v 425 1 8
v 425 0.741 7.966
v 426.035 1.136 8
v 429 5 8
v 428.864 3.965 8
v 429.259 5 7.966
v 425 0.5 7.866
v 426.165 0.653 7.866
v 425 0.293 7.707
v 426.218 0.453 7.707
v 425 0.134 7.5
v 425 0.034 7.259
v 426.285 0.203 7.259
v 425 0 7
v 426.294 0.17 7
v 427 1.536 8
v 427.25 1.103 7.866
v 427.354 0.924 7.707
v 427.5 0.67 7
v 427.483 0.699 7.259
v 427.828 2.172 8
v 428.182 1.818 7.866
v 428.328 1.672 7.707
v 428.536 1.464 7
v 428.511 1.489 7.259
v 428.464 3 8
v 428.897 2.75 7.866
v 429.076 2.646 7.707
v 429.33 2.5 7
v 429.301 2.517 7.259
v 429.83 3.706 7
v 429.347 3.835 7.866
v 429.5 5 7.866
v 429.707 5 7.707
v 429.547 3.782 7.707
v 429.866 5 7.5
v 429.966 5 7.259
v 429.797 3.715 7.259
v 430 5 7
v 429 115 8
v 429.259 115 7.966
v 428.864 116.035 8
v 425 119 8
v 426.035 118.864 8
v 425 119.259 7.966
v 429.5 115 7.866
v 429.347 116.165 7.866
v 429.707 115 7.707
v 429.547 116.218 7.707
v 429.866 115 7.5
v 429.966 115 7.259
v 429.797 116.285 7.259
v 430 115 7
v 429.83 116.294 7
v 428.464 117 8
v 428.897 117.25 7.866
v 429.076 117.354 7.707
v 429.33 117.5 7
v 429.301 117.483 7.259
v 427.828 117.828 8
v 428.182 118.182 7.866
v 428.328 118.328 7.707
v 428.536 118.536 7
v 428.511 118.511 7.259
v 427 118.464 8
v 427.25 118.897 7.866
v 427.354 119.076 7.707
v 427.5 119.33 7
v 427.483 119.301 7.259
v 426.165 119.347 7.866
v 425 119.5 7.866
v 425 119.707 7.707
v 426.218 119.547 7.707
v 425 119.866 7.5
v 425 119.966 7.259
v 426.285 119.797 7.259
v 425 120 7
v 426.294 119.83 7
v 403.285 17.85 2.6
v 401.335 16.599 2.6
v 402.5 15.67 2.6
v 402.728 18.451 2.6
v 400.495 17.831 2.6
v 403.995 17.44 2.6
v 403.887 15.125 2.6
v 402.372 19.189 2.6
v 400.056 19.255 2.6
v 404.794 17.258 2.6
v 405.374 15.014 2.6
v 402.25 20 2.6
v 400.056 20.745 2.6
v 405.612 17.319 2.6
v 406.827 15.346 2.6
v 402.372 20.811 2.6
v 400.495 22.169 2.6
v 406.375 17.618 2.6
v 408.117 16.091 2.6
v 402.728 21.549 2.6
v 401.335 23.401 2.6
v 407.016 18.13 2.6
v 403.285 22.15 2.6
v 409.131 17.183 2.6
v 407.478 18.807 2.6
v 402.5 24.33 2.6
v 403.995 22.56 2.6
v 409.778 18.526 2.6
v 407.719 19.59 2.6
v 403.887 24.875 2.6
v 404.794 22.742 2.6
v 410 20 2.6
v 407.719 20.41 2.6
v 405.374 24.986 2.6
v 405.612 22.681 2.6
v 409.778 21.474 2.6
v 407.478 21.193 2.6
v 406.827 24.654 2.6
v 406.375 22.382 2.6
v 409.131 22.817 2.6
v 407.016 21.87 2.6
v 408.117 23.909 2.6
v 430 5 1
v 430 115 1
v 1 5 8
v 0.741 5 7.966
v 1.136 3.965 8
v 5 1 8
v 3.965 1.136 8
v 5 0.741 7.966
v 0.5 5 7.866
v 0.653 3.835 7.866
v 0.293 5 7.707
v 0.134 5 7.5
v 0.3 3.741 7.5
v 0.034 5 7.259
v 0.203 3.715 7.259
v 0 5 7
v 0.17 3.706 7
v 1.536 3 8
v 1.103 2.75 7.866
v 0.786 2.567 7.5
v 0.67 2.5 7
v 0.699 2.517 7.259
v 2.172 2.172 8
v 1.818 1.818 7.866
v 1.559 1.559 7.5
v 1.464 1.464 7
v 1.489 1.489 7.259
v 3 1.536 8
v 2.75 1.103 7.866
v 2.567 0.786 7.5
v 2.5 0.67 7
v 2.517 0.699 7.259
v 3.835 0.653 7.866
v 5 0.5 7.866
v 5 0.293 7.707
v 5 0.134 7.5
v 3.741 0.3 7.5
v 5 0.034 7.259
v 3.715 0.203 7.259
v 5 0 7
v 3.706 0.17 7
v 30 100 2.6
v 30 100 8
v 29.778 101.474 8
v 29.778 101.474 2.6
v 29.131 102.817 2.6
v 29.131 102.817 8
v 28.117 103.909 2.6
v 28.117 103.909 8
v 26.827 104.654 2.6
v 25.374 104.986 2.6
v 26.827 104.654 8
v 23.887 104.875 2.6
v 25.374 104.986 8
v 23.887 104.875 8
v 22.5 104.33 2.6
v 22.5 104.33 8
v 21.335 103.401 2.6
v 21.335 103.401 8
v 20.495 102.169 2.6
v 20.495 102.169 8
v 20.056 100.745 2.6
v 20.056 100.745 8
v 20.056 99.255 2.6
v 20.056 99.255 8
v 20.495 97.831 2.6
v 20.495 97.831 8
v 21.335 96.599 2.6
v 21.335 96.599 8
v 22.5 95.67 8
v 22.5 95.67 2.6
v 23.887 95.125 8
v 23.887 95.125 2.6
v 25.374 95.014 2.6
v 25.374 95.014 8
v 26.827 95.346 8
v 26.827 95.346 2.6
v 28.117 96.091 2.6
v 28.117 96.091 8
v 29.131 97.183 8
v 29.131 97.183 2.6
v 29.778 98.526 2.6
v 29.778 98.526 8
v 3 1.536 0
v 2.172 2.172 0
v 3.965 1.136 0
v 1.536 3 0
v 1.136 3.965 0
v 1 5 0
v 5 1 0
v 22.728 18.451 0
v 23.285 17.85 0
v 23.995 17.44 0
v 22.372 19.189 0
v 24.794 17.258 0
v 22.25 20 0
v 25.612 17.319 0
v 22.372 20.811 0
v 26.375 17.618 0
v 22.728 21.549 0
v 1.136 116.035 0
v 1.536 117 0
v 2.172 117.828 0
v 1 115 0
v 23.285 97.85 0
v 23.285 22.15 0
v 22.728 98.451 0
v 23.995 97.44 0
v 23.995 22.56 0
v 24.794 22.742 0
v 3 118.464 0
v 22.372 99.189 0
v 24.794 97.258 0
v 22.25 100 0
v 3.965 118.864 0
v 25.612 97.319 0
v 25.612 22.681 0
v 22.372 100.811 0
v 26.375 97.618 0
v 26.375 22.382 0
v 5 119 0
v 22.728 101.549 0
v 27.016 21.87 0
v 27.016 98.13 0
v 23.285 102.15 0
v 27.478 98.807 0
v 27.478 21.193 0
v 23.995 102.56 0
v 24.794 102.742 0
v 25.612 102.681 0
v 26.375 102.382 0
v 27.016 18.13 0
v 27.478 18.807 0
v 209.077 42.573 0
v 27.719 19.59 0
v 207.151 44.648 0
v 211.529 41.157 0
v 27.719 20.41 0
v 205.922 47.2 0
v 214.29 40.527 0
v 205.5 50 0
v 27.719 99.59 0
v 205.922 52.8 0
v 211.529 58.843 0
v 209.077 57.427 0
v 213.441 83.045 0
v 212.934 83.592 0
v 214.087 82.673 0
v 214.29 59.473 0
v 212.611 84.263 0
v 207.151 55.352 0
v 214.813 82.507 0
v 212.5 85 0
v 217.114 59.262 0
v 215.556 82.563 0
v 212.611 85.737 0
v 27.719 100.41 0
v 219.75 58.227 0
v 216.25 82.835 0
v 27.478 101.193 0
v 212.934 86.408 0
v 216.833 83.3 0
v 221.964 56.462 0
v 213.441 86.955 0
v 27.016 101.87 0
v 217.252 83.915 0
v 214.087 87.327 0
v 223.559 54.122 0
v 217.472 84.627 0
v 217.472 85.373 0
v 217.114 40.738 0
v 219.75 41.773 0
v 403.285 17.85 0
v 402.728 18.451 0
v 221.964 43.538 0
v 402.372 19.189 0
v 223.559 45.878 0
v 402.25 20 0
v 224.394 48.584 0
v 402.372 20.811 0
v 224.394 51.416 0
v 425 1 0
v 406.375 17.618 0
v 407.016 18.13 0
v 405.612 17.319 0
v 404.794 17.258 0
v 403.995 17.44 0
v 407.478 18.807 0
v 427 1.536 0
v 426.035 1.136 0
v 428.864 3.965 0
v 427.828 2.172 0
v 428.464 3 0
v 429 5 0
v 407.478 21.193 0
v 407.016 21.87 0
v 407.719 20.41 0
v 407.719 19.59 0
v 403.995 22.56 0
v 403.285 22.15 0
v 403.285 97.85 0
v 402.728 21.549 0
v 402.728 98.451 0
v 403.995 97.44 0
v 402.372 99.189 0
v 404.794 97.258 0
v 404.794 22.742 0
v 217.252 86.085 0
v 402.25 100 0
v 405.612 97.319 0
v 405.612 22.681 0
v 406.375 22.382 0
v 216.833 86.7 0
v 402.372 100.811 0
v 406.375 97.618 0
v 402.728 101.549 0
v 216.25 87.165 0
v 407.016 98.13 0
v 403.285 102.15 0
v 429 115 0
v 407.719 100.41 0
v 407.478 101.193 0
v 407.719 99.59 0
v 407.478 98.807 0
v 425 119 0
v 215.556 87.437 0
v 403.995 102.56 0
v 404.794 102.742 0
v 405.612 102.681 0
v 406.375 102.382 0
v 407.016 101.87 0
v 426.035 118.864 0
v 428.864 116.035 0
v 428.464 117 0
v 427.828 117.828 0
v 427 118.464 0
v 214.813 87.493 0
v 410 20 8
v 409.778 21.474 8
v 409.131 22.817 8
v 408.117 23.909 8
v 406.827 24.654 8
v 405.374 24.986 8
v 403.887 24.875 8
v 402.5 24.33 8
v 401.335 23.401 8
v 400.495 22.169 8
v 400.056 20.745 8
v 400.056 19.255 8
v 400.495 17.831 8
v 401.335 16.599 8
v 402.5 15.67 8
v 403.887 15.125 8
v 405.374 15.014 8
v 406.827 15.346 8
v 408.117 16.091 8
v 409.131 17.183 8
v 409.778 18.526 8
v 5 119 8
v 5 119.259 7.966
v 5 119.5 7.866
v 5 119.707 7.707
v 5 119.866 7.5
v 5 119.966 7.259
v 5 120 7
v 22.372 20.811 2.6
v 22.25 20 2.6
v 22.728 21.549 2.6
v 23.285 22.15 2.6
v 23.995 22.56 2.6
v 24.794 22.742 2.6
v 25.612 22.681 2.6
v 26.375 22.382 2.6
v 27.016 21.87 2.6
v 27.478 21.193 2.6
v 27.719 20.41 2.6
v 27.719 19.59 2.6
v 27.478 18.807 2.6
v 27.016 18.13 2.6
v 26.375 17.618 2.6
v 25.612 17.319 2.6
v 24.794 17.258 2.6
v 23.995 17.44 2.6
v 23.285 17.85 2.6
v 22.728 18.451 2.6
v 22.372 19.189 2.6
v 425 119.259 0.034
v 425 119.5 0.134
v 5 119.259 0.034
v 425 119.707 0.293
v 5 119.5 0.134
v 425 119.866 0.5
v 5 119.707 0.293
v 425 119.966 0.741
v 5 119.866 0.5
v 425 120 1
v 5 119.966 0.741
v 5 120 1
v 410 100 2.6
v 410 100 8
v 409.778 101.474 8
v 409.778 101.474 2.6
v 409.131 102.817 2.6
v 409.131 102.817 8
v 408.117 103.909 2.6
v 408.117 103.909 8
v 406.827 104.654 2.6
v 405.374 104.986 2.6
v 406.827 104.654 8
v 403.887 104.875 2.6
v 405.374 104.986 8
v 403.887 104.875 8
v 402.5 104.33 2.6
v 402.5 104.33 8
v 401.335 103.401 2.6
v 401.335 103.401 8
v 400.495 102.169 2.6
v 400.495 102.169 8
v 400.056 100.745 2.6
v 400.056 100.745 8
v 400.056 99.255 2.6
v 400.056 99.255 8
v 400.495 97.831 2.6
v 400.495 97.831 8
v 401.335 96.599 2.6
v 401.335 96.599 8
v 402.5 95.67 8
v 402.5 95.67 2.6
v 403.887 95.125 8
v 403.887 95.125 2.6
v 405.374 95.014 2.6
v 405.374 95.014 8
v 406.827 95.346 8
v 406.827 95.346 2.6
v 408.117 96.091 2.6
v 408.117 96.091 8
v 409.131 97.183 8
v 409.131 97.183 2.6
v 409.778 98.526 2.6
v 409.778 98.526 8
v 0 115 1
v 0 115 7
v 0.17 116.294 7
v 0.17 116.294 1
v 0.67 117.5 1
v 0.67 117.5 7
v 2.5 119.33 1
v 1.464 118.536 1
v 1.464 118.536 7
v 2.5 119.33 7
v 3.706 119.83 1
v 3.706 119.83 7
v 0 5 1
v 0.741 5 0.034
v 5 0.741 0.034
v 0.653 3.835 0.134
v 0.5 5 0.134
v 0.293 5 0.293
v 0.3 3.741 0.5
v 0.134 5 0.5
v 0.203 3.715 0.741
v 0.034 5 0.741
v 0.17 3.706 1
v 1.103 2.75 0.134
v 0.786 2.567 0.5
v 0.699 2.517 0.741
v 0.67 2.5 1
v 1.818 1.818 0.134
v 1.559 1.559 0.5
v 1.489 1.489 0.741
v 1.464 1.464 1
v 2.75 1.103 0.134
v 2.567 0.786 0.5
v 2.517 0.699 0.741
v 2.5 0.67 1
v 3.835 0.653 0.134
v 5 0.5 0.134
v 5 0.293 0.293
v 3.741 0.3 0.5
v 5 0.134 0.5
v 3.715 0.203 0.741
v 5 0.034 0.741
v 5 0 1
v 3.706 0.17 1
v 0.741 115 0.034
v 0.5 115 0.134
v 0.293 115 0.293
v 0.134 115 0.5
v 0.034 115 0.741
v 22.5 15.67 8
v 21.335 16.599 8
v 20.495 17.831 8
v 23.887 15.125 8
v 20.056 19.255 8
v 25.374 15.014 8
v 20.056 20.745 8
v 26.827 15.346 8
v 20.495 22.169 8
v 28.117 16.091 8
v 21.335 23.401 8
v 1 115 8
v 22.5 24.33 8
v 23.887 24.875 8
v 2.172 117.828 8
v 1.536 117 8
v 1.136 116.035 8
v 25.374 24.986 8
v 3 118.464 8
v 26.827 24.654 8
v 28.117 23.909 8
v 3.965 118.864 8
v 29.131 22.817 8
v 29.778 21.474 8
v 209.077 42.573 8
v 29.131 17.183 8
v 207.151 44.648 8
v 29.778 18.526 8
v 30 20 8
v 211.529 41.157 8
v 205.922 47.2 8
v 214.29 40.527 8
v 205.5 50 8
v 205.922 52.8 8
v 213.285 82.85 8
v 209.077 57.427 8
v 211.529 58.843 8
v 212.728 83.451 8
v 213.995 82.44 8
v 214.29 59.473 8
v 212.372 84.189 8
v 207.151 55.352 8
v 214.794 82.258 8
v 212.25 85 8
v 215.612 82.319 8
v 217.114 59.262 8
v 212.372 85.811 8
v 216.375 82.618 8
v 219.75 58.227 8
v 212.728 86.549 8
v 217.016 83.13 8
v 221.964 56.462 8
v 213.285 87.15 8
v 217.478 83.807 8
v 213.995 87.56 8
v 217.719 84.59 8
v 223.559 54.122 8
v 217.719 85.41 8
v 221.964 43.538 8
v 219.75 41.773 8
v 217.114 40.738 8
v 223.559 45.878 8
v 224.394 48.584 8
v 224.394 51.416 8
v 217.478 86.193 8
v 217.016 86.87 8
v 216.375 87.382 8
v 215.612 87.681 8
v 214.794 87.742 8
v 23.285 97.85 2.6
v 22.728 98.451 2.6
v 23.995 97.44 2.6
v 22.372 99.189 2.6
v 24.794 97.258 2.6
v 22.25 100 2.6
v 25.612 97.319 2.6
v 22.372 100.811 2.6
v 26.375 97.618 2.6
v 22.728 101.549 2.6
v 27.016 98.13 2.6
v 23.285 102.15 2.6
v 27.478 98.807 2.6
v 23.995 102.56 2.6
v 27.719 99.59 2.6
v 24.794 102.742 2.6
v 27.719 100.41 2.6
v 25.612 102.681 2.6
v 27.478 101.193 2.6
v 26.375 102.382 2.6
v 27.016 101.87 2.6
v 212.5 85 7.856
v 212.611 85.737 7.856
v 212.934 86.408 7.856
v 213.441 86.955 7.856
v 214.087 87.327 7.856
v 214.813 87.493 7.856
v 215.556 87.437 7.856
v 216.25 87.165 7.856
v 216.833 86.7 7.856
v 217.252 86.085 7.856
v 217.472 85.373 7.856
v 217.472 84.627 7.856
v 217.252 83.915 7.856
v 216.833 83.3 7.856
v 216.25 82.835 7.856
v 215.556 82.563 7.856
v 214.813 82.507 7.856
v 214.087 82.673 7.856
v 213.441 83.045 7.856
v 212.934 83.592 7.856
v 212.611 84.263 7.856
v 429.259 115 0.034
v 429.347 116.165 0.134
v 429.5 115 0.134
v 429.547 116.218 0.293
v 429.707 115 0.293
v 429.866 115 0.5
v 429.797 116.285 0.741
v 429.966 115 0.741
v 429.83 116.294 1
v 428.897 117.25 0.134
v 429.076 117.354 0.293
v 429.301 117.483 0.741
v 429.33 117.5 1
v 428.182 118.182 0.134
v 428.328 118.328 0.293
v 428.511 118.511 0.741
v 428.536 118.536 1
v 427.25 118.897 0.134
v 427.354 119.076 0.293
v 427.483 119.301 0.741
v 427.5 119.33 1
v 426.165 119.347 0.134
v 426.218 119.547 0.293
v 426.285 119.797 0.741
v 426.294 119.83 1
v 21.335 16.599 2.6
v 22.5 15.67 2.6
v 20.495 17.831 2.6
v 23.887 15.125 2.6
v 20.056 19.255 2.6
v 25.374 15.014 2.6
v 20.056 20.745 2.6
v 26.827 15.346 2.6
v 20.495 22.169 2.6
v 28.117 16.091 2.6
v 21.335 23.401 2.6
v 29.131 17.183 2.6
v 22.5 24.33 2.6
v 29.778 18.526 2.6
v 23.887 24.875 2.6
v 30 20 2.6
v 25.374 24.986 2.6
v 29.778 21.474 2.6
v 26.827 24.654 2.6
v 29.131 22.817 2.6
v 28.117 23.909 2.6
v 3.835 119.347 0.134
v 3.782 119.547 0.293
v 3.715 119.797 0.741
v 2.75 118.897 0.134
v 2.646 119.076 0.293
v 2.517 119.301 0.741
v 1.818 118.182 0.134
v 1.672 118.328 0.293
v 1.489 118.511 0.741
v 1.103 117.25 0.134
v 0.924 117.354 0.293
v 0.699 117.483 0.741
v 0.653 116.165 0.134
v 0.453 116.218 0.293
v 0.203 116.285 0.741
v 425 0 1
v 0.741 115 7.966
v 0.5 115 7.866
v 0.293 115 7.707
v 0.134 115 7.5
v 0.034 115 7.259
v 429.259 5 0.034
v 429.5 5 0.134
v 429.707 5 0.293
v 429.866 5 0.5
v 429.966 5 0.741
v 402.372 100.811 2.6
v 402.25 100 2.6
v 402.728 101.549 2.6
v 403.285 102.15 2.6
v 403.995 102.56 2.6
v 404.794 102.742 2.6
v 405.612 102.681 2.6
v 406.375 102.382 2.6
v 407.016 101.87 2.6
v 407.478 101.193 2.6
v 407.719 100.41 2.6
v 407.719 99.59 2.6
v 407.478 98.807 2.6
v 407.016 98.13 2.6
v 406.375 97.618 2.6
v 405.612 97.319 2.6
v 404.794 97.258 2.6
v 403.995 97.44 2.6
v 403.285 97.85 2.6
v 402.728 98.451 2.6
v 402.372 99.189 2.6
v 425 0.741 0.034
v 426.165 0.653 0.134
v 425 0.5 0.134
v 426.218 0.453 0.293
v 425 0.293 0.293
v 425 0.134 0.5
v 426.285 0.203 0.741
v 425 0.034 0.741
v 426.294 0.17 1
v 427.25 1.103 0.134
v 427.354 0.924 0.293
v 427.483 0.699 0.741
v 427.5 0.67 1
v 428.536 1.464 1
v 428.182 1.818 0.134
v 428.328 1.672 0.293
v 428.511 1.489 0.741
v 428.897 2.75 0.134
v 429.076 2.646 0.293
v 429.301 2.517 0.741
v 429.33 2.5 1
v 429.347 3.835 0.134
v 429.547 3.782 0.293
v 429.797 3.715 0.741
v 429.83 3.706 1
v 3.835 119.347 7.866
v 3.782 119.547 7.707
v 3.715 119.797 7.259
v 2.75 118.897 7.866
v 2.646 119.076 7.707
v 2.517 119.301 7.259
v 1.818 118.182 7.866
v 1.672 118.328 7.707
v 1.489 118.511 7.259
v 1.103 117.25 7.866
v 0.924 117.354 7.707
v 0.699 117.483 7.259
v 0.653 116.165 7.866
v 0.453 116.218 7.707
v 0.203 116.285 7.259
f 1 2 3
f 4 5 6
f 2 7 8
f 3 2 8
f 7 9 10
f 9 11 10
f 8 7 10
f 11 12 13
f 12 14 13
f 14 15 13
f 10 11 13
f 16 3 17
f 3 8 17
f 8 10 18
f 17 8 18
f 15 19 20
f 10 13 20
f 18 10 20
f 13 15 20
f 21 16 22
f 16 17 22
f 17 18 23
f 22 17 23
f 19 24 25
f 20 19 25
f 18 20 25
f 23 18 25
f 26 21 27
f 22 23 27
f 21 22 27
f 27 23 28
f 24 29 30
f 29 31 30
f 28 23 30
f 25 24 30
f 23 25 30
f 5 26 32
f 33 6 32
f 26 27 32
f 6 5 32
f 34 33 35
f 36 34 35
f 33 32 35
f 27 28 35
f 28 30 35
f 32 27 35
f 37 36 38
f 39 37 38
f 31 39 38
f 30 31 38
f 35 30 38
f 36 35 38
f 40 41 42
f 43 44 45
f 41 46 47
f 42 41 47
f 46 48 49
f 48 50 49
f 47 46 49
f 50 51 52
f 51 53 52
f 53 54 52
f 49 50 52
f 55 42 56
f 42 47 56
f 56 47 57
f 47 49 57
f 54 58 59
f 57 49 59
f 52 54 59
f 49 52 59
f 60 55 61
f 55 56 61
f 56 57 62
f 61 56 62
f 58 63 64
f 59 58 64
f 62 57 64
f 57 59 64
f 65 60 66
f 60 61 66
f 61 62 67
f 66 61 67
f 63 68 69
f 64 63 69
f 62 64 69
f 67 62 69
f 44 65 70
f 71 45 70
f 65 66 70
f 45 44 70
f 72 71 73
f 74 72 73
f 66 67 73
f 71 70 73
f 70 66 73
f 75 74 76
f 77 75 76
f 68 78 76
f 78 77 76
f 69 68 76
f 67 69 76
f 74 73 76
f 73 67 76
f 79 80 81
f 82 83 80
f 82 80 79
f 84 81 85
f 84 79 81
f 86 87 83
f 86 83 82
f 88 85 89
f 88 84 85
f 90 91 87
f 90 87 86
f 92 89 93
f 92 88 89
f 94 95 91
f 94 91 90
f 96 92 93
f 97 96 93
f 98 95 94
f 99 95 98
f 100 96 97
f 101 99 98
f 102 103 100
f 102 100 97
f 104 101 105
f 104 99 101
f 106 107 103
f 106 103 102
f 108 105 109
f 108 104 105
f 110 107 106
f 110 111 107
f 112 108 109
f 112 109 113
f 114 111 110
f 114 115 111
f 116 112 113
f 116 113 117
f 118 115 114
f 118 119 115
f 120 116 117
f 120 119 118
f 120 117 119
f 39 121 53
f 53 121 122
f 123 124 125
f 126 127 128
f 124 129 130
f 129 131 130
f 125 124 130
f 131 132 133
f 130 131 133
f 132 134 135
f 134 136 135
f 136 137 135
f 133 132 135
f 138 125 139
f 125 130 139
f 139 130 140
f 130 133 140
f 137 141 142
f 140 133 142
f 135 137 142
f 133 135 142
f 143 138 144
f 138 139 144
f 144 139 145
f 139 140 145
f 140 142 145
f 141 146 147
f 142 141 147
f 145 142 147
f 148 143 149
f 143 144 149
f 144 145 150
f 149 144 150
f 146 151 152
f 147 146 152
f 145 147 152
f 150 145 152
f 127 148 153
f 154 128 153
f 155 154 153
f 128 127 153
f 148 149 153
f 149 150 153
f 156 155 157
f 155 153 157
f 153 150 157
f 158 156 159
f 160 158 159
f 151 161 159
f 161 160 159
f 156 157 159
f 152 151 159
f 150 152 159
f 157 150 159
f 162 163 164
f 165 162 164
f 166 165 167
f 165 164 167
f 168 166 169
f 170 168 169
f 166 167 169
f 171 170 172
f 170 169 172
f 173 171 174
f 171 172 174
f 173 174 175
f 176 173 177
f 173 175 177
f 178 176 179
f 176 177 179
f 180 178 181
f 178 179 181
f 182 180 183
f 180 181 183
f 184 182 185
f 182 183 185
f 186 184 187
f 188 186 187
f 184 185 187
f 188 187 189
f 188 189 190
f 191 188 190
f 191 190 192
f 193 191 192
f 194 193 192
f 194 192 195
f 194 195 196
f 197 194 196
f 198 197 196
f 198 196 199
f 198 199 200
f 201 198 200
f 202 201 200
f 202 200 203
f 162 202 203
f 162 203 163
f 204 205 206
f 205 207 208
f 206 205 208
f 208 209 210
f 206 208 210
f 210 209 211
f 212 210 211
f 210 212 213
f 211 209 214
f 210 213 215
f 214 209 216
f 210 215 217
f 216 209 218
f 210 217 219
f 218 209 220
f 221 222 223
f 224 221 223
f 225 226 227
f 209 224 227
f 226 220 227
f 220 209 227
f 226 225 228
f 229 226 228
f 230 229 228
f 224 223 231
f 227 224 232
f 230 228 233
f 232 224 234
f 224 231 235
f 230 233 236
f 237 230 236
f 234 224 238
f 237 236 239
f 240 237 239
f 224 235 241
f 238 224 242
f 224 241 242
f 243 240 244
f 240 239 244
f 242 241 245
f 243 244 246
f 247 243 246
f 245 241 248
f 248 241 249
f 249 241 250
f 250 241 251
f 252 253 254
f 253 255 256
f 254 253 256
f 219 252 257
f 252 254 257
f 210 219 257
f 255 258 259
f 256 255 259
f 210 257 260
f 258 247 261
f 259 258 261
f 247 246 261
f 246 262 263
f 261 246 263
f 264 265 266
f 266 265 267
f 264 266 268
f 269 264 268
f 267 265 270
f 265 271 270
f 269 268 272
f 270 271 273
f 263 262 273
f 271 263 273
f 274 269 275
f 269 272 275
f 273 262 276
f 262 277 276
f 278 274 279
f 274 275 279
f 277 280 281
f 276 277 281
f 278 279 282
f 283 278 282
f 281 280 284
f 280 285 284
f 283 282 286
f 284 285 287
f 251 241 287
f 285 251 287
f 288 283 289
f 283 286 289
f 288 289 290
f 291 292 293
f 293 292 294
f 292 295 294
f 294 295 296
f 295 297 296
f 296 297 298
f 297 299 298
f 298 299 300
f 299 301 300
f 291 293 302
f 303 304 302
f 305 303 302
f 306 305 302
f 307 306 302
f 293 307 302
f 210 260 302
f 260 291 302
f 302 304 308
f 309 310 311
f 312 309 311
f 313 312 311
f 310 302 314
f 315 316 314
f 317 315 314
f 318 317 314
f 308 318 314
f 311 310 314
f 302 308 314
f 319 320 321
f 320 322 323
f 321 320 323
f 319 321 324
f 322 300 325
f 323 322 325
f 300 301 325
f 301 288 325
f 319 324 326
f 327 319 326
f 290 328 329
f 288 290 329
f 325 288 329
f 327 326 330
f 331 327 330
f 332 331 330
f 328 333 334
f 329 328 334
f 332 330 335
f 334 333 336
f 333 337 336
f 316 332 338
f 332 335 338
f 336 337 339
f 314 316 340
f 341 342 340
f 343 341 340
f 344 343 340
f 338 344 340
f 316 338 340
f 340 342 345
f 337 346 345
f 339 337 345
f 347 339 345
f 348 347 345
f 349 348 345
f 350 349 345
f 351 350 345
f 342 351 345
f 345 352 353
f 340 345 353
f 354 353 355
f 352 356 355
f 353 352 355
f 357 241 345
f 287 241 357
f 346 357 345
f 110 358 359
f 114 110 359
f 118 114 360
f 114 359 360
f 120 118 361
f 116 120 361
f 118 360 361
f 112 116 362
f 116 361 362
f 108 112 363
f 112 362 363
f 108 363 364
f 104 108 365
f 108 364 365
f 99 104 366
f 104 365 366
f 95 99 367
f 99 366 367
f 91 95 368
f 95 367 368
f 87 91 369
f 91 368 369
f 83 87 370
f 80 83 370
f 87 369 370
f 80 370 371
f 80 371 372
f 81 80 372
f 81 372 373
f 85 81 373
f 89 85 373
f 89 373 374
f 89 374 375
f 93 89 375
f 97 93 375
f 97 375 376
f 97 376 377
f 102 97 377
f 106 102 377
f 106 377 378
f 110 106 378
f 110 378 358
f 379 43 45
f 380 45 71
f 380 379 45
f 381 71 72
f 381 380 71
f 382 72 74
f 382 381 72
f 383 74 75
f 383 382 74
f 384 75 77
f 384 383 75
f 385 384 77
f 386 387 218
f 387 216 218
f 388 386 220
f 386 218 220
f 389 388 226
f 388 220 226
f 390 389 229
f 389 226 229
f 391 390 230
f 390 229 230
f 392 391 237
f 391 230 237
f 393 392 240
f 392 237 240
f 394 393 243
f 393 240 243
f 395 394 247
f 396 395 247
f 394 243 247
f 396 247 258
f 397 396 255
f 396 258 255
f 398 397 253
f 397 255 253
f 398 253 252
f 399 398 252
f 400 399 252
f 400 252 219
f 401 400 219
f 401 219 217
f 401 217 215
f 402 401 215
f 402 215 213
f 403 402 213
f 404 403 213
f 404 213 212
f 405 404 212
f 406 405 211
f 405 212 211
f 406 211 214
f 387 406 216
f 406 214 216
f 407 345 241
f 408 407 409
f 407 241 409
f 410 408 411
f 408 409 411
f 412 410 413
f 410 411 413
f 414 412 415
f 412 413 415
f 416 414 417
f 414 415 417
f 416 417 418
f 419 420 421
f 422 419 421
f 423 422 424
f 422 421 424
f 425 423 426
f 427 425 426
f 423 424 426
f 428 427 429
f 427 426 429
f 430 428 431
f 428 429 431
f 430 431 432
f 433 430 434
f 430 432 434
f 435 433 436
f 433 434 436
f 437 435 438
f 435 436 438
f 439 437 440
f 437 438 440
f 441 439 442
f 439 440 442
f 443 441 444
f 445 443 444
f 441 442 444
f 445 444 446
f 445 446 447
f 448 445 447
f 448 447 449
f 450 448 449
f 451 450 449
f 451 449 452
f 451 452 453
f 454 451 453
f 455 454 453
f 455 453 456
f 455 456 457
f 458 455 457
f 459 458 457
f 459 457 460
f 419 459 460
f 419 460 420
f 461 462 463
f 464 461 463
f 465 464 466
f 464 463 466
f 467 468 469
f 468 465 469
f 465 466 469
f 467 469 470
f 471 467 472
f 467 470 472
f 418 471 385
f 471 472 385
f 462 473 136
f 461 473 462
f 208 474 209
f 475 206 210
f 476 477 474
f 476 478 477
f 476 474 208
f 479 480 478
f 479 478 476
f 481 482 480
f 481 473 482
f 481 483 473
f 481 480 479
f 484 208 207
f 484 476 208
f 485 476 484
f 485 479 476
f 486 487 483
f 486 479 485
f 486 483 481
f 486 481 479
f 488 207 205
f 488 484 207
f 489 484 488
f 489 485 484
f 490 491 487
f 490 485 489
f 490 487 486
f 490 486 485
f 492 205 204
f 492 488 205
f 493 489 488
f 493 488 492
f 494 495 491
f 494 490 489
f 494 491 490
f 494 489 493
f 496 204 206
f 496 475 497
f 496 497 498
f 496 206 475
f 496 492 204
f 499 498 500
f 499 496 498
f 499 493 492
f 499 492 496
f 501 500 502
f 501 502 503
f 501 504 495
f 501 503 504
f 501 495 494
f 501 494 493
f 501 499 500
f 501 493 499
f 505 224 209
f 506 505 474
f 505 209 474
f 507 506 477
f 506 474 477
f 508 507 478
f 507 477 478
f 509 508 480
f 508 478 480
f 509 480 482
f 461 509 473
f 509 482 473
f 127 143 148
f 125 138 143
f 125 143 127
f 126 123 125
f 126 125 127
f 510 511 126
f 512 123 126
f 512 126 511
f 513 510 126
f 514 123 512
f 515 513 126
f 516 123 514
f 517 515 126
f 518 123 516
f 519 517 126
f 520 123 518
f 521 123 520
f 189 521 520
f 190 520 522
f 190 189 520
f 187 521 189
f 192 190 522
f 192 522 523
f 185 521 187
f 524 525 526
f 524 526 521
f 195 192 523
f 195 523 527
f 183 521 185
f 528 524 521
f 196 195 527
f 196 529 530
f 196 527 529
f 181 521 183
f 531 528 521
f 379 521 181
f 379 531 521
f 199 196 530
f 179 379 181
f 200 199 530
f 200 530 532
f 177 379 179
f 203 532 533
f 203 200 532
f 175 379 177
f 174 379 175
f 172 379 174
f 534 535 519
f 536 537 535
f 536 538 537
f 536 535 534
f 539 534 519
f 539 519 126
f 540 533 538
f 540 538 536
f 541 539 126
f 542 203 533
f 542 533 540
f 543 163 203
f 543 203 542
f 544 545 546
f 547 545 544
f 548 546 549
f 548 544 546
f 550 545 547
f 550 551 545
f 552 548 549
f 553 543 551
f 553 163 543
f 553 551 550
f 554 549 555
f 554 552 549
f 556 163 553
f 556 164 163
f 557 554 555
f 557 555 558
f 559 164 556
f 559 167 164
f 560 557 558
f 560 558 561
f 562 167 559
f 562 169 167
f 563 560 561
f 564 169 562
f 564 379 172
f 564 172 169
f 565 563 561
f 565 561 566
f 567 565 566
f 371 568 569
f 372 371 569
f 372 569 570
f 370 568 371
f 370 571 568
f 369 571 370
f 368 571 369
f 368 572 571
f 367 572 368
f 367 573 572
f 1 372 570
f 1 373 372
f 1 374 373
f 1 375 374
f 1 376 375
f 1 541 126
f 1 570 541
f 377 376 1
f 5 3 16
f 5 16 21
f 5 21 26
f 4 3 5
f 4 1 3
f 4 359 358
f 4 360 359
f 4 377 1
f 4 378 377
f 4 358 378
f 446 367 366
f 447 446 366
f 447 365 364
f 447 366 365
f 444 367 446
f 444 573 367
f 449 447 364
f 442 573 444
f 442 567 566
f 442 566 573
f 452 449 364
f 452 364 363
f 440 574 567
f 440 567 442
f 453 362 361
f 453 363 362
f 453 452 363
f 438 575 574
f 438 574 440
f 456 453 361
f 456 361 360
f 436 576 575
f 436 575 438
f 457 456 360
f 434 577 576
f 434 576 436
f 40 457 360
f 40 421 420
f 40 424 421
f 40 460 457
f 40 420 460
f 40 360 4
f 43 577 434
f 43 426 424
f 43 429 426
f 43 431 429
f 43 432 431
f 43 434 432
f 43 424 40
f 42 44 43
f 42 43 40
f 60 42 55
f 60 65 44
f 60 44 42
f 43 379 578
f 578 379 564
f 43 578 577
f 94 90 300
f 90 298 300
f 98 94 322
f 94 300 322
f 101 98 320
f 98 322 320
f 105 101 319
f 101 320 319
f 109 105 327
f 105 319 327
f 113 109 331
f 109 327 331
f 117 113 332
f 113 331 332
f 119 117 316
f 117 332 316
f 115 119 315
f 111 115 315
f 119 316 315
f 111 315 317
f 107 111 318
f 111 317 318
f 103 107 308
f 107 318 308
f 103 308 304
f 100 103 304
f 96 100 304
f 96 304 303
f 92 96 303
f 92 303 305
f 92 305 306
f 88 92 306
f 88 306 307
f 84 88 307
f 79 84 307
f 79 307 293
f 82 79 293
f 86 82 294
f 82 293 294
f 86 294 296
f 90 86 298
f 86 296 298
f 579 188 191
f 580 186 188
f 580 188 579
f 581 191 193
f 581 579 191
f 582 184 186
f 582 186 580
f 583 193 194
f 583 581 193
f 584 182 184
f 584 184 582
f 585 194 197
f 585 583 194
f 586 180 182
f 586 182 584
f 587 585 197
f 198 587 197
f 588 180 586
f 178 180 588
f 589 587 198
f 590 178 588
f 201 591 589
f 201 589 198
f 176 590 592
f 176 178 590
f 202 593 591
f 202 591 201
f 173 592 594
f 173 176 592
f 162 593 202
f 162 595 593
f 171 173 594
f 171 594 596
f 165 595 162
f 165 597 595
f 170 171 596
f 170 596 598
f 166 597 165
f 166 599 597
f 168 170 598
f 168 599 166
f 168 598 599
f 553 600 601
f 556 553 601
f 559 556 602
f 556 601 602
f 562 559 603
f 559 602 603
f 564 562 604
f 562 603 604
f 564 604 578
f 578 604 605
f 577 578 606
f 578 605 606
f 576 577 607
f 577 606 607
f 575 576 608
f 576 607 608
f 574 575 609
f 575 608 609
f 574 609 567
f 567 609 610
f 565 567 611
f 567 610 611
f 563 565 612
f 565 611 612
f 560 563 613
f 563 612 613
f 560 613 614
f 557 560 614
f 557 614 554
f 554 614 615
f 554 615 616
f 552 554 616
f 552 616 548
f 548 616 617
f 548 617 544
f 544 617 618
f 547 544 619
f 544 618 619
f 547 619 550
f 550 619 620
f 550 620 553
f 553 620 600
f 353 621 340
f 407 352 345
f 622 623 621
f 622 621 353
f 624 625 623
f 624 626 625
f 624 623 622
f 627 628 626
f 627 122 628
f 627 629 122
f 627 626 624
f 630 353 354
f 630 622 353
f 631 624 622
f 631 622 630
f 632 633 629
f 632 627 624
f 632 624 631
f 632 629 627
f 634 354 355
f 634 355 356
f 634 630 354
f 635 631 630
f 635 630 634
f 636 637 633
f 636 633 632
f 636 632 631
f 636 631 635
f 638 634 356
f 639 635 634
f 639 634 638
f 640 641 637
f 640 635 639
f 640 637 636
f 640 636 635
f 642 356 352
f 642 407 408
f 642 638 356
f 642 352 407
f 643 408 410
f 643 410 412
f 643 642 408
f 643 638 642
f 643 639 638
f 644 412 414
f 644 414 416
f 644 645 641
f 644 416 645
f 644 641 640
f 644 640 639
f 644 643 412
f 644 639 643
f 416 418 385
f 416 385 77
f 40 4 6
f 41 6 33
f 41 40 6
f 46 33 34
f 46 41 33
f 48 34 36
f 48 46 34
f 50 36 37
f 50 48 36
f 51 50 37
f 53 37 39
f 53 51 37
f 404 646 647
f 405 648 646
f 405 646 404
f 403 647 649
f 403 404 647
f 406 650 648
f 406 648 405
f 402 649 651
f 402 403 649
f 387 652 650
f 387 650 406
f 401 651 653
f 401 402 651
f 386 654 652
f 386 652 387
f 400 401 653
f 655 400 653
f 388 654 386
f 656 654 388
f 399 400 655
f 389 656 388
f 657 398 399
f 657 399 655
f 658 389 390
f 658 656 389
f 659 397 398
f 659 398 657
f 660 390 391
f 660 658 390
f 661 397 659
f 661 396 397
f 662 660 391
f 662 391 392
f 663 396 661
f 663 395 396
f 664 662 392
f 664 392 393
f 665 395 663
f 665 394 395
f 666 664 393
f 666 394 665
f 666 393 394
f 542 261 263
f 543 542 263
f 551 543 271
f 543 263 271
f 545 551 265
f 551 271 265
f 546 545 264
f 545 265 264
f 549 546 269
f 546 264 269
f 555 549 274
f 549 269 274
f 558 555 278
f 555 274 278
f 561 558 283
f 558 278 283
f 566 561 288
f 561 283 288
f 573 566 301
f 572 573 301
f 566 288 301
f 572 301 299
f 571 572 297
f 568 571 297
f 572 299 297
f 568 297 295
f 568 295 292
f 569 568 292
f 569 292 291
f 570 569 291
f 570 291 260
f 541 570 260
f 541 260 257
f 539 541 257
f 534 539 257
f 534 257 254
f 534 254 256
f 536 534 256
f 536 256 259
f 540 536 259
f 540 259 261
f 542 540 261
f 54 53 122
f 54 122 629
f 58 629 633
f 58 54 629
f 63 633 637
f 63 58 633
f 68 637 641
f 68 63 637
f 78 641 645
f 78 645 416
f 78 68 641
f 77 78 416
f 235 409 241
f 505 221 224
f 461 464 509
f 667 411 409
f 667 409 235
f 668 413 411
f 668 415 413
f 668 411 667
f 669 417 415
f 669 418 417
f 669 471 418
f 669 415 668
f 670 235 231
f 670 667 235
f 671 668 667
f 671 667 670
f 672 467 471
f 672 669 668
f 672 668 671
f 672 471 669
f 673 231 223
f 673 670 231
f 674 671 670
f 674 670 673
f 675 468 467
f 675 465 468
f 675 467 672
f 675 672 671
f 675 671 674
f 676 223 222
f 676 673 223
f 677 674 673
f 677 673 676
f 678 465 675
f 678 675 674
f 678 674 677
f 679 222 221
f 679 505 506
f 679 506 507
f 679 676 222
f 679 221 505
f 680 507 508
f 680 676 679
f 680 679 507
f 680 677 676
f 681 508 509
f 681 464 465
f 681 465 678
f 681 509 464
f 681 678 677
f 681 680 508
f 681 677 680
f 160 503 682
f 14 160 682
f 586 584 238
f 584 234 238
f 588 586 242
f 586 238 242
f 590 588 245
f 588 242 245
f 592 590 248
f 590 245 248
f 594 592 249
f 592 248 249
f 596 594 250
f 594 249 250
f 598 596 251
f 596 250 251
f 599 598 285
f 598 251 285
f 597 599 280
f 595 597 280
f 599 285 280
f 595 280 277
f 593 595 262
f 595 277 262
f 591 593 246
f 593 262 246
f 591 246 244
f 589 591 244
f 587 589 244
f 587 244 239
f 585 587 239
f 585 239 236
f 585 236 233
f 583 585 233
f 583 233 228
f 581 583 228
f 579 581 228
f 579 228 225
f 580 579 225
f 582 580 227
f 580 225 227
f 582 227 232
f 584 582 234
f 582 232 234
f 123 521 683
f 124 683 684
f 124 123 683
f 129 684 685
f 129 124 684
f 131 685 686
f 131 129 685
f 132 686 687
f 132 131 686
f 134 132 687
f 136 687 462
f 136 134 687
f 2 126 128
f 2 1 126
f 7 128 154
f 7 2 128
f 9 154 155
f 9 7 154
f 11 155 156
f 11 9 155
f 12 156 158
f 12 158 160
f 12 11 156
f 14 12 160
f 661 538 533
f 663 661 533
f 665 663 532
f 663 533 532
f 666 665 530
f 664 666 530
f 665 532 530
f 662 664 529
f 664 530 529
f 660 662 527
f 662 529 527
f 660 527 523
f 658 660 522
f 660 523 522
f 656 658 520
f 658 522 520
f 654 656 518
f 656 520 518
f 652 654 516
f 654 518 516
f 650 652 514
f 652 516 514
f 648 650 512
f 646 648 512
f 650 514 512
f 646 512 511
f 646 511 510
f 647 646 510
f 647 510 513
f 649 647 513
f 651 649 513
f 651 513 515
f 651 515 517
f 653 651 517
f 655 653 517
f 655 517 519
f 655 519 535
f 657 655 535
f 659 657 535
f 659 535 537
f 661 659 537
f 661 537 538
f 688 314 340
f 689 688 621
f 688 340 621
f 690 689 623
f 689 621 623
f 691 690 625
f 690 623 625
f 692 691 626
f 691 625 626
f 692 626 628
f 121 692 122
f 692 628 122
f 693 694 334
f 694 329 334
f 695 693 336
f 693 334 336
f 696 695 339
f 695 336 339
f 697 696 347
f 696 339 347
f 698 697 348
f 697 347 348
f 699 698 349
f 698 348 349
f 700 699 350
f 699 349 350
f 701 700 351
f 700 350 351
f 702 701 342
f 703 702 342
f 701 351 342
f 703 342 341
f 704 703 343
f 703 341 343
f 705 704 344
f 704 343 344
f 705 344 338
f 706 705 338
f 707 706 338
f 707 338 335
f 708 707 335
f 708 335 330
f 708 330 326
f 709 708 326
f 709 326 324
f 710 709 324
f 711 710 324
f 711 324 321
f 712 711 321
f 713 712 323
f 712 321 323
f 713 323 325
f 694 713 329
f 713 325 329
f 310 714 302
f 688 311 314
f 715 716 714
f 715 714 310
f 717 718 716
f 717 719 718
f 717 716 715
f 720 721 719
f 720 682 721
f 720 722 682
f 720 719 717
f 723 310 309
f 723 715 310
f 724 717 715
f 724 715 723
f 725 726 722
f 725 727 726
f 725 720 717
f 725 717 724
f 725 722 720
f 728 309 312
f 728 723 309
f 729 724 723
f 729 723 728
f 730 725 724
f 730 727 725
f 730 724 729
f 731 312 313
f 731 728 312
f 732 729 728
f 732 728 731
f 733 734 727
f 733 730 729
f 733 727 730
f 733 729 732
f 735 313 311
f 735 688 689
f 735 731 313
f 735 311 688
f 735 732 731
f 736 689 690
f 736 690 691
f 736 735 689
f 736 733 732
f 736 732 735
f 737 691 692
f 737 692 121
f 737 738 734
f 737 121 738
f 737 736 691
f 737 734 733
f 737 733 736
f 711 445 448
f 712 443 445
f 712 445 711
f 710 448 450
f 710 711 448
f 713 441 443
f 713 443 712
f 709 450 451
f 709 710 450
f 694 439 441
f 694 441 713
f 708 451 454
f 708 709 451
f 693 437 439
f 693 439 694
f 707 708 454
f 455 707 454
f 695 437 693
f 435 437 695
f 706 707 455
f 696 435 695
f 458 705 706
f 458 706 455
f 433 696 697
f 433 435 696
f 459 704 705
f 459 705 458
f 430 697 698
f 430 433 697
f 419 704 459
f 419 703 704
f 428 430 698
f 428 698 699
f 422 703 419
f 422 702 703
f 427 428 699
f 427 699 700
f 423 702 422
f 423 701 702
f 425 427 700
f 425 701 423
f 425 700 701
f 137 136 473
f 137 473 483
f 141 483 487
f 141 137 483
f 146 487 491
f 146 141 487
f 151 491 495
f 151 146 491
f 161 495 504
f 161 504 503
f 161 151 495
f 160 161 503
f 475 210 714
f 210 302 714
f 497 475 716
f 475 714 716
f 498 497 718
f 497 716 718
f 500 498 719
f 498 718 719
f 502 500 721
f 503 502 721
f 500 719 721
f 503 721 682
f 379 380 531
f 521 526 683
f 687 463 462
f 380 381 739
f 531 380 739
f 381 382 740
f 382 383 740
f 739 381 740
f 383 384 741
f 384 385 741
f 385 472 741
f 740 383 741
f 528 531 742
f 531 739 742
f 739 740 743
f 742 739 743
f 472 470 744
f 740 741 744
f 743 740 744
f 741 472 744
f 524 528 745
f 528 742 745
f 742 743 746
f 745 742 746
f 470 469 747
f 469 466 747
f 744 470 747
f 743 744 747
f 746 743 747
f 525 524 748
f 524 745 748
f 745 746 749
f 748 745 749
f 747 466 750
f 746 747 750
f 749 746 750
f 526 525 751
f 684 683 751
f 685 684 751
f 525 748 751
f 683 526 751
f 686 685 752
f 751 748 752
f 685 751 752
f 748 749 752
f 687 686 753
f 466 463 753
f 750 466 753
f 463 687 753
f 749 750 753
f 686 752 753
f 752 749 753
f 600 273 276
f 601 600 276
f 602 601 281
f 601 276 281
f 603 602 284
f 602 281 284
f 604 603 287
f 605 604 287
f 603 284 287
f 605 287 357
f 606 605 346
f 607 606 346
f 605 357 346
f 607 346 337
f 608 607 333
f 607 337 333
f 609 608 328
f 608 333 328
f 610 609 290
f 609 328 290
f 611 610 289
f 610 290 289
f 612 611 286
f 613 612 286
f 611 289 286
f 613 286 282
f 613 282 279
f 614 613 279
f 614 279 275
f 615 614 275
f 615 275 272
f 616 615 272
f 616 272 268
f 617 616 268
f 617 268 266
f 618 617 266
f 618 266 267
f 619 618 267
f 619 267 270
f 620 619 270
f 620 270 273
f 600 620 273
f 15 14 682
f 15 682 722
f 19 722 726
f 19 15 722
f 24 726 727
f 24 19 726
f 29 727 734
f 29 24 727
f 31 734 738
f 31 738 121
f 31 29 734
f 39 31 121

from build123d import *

# Parameters (mm, degrees)
SKETCH1_W                                           = 430
SKETCH1_H                                           = 120
EXTRUDE1_DEPTH                                      = 8
FILLET1_R                                           = 5
FILLET2_R                                           = 1
F_5_0_5_DIAMETER_HOLE1_D                            = 5
F_19_0_19_DIAMETER_HOLE1_D                          = 19
CHAMFER1_SIZE                                       = 0.25
CHAMFER1_SIZE2                                      = 0.144337567
CBORE_FOR_M5_HEX_SOCKET_HEAD_CAP_SCREW1_D           = 5.5
CBORE_FOR_M5_HEX_SOCKET_HEAD_CAP_SCREW1_CBORE_D     = 10
CBORE_FOR_M5_HEX_SOCKET_HEAD_CAP_SCREW1_CBORE_DEPTH = 5.4


with BuildPart() as part:
    # Sketch1 → Extrude1 (new body)
    with BuildSketch(Plane.XY):
        with Locations((215, 60)):
            Rectangle(SKETCH1_W, SKETCH1_H)
    extrude(amount=EXTRUDE1_DEPTH)

    # Fillet1
    fillet1_edges = [part.edges().sort_by_distance(p)[0] for p in [
        (0, 120, 4),
        (430, 120, 4),
        (430, 0, 4),
        (0, 0, 4),
    ]]
    fillet(fillet1_edges, radius=FILLET1_R)

    # Fillet2
    fillet2_edges = [part.edges().sort_by_distance(p)[0] for p in [
        (215, 0, 0),
        (215, 0, 8),
        (0, 60, 0),
        (215, 120, 0),
        (430, 60, 0),
        (1.464466094, 118.535533906, 0),
        (428.535533906, 118.535533906, 0),
        (428.535533906, 1.464466094, 0),
        (1.464466094, 1.464466094, 0),
        (0, 60, 8),
        (430, 60, 8),
        (215, 120, 8),
        (1.464466094, 118.535533906, 8),
        (428.535533906, 118.535533906, 8),
        (428.535533906, 1.464466094, 8),
        (1.464466094, 1.464466094, 8),
    ]]
    fillet(fillet2_edges, radius=FILLET2_R)

    # Ø5.0 (5) Diameter Hole1 (through all)
    with Locations(Plane(origin=(215, 85, 8), x_dir=(1, 0, 0), z_dir=(0, 0, 1))):
        with Locations((0, 0)):
            Hole(F_5_0_5_DIAMETER_HOLE1_D / 2)

    # Ø19.0 (19) Diameter Hole1 (through all)
    with Locations(Plane(origin=(215, 50, 8), x_dir=(1, 0, 0), z_dir=(0, 0, 1))):
        with Locations((0, 0)):
            Hole(F_19_0_19_DIAMETER_HOLE1_D / 2)

    # Chamfer1
    chamfer1_edges = [part.edges().sort_by_distance(p)[0] for p in [
        (217.5, 85, 8),
    ]]
    chamfer1_side = [part.faces().sort_by_distance(p)[0] for p in [
        (215, 60.046713467, 8),
    ]]
    chamfer(chamfer1_edges, length=CHAMFER1_SIZE, length2=CHAMFER1_SIZE2, reference=chamfer1_side[0])

    # CBORE for M5 Hex Socket Head Cap Screw1 (through all)
    with Locations(Plane(origin=(25, 20, 8), x_dir=(1, 0, 0), z_dir=(0, 0, 1))):
        with Locations((0, 0), (0, 80), (380, 0), (380, 80)):
            CounterBoreHole(CBORE_FOR_M5_HEX_SOCKET_HEAD_CAP_SCREW1_D / 2, CBORE_FOR_M5_HEX_SOCKET_HEAD_CAP_SCREW1_CBORE_D / 2, CBORE_FOR_M5_HEX_SOCKET_HEAD_CAP_SCREW1_CBORE_DEPTH)


solid = part.part
